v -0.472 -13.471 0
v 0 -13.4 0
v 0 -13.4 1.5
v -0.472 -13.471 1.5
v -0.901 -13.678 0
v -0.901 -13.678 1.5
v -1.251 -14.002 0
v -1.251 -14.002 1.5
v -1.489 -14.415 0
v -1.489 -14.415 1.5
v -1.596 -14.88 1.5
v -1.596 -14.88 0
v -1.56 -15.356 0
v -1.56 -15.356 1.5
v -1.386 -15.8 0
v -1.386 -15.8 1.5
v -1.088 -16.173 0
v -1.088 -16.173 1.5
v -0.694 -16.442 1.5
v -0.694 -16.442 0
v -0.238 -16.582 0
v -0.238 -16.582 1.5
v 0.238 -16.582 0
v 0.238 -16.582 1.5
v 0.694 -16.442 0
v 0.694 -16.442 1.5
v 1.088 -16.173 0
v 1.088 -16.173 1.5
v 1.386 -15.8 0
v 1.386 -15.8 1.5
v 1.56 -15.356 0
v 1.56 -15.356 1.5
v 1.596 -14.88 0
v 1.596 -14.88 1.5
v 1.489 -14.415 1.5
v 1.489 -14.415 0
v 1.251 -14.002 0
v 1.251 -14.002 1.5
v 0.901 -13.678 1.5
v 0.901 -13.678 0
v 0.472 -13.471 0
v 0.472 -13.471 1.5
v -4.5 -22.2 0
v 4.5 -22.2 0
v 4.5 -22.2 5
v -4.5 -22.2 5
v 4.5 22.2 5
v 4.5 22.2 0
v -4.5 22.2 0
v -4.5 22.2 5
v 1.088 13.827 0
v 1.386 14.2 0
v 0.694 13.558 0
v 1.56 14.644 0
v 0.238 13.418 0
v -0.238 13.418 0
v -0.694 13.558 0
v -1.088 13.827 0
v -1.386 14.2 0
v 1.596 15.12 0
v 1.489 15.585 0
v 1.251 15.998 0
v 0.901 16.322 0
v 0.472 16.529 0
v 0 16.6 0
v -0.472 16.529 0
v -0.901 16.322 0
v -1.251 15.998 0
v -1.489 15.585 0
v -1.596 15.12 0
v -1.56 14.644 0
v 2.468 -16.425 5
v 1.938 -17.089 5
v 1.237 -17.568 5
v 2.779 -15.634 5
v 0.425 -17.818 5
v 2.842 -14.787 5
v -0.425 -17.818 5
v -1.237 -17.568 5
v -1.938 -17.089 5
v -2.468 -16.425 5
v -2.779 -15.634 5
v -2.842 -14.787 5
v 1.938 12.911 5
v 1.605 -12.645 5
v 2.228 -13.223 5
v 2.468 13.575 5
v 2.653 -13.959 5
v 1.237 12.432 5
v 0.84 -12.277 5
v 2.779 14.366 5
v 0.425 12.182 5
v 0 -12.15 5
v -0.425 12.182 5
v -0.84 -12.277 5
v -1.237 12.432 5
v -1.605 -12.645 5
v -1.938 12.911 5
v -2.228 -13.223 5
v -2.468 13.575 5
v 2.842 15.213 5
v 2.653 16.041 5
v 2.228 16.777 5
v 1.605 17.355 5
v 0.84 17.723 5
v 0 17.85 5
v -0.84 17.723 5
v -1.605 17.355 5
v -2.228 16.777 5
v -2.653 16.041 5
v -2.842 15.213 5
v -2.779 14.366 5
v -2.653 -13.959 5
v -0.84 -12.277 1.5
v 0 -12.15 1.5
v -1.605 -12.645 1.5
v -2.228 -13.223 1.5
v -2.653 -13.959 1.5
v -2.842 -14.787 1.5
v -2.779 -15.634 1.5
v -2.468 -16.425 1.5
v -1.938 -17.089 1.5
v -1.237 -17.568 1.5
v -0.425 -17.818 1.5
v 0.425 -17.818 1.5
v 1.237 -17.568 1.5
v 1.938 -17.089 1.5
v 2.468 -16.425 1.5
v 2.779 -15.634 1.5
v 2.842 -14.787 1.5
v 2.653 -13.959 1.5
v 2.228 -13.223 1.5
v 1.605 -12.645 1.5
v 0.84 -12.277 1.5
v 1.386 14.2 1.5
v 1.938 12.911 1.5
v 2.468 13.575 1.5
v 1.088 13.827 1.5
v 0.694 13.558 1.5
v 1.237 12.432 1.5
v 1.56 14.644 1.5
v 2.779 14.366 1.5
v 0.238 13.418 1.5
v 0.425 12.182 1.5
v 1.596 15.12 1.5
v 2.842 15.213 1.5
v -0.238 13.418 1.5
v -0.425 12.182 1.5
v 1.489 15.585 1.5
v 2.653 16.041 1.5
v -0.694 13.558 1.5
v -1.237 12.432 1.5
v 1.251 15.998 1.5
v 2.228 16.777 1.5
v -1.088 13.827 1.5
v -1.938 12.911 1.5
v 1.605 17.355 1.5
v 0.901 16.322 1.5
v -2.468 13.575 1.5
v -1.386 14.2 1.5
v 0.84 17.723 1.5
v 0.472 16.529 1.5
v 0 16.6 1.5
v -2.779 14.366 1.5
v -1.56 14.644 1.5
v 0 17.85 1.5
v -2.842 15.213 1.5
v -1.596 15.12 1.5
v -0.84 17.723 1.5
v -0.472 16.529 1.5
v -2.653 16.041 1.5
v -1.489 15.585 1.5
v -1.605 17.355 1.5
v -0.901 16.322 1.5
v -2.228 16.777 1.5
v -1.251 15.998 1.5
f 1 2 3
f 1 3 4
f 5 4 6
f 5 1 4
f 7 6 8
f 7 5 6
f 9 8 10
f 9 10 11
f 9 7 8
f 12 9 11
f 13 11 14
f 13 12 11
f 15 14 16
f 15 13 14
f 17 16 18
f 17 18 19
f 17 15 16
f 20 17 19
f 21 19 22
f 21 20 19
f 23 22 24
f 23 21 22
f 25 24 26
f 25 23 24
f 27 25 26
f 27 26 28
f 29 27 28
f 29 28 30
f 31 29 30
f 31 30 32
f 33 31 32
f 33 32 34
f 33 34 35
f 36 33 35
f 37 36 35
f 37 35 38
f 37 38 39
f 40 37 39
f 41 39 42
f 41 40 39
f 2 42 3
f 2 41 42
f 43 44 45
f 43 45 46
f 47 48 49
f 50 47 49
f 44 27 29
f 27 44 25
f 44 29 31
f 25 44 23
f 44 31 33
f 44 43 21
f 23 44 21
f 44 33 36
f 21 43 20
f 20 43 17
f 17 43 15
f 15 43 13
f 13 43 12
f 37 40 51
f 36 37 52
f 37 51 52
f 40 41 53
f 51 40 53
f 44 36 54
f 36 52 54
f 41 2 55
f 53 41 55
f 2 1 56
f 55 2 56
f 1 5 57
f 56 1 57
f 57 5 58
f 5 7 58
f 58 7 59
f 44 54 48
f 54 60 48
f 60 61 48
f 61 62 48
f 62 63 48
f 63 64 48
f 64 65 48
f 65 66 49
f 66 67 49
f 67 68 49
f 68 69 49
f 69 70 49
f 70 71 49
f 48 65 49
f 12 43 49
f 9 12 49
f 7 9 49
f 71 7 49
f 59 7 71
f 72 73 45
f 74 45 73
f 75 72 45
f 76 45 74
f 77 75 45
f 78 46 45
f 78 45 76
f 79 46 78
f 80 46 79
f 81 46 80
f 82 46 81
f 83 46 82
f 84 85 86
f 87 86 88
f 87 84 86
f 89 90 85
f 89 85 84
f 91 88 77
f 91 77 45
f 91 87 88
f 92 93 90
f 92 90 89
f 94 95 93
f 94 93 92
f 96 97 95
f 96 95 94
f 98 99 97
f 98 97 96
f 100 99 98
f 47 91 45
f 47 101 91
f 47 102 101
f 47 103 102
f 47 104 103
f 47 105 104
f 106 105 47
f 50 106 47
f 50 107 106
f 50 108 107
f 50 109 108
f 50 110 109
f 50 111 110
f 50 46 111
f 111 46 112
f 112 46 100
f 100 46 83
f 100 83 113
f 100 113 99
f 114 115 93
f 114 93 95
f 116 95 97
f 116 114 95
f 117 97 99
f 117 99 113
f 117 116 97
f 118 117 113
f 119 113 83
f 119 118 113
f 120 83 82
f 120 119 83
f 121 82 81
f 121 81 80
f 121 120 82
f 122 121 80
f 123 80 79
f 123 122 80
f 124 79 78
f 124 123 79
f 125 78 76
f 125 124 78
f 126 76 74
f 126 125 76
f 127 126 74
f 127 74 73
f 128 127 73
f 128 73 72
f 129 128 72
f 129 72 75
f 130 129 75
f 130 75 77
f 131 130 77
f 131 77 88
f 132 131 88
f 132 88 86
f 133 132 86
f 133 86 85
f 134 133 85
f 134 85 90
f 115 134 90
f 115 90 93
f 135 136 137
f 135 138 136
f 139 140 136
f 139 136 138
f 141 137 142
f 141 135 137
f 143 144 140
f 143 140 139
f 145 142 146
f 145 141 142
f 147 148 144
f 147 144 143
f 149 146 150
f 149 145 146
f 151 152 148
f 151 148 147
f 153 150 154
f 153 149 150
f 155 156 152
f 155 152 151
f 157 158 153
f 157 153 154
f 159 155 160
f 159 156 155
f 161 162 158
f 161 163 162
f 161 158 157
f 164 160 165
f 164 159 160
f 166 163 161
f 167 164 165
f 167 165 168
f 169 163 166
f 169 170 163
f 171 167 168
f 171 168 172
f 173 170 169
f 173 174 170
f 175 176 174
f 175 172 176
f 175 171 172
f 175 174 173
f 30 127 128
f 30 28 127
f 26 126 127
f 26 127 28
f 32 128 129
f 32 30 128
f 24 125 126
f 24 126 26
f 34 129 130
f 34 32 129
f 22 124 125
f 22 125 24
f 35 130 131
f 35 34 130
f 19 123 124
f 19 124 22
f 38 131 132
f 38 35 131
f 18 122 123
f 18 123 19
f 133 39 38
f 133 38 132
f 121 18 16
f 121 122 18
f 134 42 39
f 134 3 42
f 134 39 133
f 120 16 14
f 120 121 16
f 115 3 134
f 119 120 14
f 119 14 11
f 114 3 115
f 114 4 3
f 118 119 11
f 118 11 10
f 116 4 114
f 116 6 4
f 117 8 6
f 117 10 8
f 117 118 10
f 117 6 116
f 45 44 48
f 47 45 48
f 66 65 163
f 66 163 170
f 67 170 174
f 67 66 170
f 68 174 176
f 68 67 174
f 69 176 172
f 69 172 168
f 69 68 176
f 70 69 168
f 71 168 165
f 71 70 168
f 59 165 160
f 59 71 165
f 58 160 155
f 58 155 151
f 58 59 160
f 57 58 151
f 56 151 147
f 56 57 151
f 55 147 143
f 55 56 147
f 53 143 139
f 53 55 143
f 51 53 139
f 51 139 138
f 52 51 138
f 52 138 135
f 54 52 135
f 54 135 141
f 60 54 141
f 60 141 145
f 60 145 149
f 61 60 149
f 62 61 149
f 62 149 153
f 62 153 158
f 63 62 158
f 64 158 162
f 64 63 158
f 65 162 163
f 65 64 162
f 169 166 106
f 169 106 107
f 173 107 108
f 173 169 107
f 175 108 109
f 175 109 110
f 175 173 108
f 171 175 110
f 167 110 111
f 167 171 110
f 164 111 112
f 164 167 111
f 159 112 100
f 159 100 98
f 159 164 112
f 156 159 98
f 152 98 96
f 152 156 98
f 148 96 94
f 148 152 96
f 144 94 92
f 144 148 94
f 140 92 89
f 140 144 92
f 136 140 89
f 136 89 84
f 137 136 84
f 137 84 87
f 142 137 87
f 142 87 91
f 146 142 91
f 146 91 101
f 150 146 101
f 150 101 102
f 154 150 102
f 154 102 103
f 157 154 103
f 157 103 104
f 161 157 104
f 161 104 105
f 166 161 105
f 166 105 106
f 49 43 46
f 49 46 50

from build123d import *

# Parameters (mm, degrees)
SKETCH1_W           = 44.4
SKETCH1_H           = 9
SKETCH1_R           = 2.85
BOSS_EXTRUDE1_DEPTH = 5
SKETCH1_3_R         = 2.85
SKETCH1_3_R_2       = 1.6
BOSS_EXTRUDE2_DEPTH = 1.5


with BuildPart() as part:
    # Sketch1 → Boss-Extrude1 (new body)
    with BuildSketch(Plane(origin=(0, 0, 0), x_dir=(0, 1, 0), z_dir=(0, 0, 1))):
        Rectangle(SKETCH1_W, SKETCH1_H)
        with Locations((-15, 0)):
            Circle(SKETCH1_R, mode=Mode.SUBTRACT)
        with Locations((15, 0)):
            Circle(SKETCH1_R, mode=Mode.SUBTRACT)
    extrude(amount=BOSS_EXTRUDE1_DEPTH)

    # Sketch1<3> → Boss-Extrude2 (add)
    # profile 1 of 2: a face of its own
    with BuildSketch(Plane(origin=(0, 0, 0), x_dir=(0, 1, 0), z_dir=(0, 0, 1))):
        with Locations((15, 0)):
            Circle(SKETCH1_3_R)
        with Locations((15, 0)):
            Circle(SKETCH1_3_R_2, mode=Mode.SUBTRACT)
    # profile 2 of 2: a face of its own
    with BuildSketch(Plane(origin=(0, 0, 0), x_dir=(0, 1, 0), z_dir=(0, 0, 1))):
        with Locations((-15, 0)):
            Circle(SKETCH1_3_R)
        with Locations((-15, 0)):
            Circle(SKETCH1_3_R_2, mode=Mode.SUBTRACT)
    extrude(amount=BOSS_EXTRUDE2_DEPTH)


solid = part.part
